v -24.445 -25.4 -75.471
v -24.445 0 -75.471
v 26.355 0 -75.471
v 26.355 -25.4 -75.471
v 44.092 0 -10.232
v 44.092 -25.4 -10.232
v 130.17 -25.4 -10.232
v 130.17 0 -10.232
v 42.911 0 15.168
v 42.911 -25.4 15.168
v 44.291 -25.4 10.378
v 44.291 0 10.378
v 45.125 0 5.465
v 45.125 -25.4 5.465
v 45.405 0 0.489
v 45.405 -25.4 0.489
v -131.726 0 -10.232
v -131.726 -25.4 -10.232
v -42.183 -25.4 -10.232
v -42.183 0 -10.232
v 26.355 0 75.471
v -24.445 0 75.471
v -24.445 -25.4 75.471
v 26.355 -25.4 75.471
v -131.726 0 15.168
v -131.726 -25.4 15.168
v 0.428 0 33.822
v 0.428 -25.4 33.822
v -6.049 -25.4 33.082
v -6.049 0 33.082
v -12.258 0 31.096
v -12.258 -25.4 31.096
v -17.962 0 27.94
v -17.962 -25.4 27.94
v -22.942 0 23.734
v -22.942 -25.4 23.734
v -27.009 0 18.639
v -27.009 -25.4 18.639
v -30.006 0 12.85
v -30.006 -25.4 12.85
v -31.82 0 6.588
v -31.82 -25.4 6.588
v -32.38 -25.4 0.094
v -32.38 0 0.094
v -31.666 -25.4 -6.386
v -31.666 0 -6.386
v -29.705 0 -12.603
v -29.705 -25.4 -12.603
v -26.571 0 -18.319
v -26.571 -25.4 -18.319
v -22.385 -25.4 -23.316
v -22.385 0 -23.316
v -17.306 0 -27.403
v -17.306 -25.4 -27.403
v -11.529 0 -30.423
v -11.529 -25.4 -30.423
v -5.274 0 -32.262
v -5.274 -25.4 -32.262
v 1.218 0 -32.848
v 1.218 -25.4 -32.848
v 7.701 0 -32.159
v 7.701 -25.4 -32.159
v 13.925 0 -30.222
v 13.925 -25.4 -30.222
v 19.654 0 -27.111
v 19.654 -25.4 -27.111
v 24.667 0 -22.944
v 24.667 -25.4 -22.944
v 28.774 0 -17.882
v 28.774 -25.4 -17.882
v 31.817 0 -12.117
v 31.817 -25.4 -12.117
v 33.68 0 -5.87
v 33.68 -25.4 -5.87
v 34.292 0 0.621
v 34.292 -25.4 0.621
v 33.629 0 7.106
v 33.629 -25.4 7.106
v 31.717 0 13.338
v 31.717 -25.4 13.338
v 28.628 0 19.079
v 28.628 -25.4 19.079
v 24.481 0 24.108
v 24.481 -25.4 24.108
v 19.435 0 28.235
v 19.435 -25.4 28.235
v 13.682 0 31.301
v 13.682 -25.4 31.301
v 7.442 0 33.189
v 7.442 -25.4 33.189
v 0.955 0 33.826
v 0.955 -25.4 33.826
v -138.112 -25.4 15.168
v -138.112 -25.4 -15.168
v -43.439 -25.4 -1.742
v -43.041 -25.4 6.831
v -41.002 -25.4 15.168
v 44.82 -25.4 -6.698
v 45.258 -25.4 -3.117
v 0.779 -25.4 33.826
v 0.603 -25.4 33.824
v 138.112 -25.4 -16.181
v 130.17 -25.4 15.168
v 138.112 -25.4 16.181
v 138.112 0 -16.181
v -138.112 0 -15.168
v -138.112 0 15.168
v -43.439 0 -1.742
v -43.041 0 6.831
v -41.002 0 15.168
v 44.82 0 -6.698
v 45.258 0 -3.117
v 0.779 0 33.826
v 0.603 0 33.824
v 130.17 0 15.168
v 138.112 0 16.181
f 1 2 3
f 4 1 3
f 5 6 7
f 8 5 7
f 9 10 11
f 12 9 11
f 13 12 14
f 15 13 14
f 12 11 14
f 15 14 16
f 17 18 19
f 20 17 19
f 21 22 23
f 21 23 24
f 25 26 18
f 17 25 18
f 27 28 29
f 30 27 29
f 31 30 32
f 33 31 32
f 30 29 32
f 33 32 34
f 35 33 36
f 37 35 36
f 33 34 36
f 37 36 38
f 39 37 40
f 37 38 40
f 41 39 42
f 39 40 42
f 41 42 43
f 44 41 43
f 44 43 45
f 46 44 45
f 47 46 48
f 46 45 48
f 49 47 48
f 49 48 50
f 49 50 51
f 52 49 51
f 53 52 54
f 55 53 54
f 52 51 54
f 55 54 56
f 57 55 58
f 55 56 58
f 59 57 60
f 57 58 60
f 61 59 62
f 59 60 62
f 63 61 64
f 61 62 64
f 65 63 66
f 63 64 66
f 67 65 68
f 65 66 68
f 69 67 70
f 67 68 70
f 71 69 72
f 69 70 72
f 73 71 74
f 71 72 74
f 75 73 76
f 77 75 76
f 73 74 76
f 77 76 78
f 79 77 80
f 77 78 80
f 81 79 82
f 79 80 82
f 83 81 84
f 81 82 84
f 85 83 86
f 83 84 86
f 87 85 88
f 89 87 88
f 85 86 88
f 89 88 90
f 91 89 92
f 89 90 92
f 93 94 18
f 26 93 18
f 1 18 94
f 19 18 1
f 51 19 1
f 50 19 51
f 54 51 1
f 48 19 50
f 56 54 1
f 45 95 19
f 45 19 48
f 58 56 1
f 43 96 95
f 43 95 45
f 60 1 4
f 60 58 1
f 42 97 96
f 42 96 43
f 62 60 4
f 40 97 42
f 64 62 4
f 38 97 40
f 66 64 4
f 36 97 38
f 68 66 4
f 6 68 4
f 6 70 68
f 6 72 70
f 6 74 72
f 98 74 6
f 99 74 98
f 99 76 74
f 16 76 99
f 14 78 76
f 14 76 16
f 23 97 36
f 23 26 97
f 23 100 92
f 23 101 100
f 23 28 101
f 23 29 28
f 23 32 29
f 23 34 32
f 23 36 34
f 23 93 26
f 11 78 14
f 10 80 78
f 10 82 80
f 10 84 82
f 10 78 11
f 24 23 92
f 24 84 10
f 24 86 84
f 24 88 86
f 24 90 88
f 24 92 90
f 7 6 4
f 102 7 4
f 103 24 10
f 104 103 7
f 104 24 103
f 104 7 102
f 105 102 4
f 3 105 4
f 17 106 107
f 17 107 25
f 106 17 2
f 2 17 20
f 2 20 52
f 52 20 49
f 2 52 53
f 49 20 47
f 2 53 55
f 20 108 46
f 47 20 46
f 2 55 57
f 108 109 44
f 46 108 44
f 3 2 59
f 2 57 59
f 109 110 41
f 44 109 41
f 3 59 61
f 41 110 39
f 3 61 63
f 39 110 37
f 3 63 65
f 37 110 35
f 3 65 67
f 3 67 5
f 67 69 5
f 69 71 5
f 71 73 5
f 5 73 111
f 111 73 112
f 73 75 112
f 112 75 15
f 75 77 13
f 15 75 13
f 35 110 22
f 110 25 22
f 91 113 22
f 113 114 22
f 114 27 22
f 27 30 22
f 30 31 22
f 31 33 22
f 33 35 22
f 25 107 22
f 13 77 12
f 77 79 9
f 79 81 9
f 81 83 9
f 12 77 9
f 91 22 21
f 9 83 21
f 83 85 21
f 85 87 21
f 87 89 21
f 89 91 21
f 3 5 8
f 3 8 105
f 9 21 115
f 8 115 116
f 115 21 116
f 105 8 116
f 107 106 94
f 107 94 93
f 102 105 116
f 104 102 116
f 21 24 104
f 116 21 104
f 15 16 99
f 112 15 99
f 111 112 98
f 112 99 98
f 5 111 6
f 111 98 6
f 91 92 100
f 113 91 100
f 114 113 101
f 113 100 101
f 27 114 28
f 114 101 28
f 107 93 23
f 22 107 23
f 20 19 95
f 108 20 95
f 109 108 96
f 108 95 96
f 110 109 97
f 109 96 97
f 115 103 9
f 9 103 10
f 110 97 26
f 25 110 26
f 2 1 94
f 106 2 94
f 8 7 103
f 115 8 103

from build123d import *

# Parameters (mm, degrees)
F0_W     = 276.225
F0_H     = 150.9410084384
F1_DEPTH = 25.4
F3_DEPTH = 25.4


with BuildPart() as f1:
    # F0 (on Front) → F1 (new body)
    with BuildSketch(Plane.XZ):
        Rectangle(F0_W, F0_H)
    extrude(amount=F1_DEPTH)

    # F2 (on face) → F3 (cut)
    with BuildSketch(Plane.XZ.offset(25.4)):
        Polygon((-138.1125, 15.167717062), (-24.4453392207, 75.4705042192), (-138.1125, 75.4705042192), align=None)
        Polygon((-138.1125, -75.4705042192), (-24.4453392207, -75.4705042192), (-138.1125, -15.167717062), align=None)
        Polygon((138.1125, 75.4705042192), (26.3546607793, 75.4705042192), (138.1125, 16.1806517634), align=None)
        Polygon((138.1125, -16.1806517634), (26.3546607793, -75.4705042192), (138.1125, -75.4705042192), align=None)
        with BuildLine():
            Line((0.9546607793, -32.84869415), (0.9546607793, 33.82630585))
            ThreePointArc((0.9546607793, 33.82630585), (0.6912380103, 33.8252650905), (0.4278316888, 33.822142877))
            ThreePointArc((0.4278316888, 33.822142877), (-32.3817984612, 0.225383081), (0.9546607793, -32.84869415))
        make_face()
        with BuildLine():
            ThreePointArc((0.9546607793, -32.84869415), (24.5278330971, -23.0843664678), (34.2921607793, 0.48880585))
            ThreePointArc((34.2921607793, 0.48880585), (24.5278330971, 24.0619781678), (0.9546607793, 33.82630585))
            Line((0.9546607793, 33.82630585), (0.9546607793, -32.84869415))
        make_face()
        with BuildLine():
            Line((-131.7264735699, -10.232282938), (-42.1830345138, -10.232282938))
            ThreePointArc((-42.1830345138, -10.232282938), (-43.4473379757, 2.5539950823), (-41.0016506128, 15.167717062))
            Line((-41.0016506128, 15.167717062), (-131.7264735699, 15.167717062))
            Line((-131.7264735699, 15.167717062), (-131.7264735699, -10.232282938))
        make_face()
        with BuildLine():
            Line((130.1703900099, 15.167717062), (42.9109721714, 15.167717062))
            ThreePointArc((42.9109721714, 15.167717062), (44.7768043906, 7.9334166062), (45.4046607793, 0.48880585))
            ThreePointArc((45.4046607793, 0.48880585), (45.0753648522, -4.9117470949), (44.0923560724, -10.232282938))
            Line((44.0923560724, -10.232282938), (130.1703900099, -10.232282938))
            Line((130.1703900099, -10.232282938), (130.1703900099, 15.167717062))
        make_face()
    extrude(amount=-F3_DEPTH, mode=Mode.SUBTRACT)


solid = f1.part
